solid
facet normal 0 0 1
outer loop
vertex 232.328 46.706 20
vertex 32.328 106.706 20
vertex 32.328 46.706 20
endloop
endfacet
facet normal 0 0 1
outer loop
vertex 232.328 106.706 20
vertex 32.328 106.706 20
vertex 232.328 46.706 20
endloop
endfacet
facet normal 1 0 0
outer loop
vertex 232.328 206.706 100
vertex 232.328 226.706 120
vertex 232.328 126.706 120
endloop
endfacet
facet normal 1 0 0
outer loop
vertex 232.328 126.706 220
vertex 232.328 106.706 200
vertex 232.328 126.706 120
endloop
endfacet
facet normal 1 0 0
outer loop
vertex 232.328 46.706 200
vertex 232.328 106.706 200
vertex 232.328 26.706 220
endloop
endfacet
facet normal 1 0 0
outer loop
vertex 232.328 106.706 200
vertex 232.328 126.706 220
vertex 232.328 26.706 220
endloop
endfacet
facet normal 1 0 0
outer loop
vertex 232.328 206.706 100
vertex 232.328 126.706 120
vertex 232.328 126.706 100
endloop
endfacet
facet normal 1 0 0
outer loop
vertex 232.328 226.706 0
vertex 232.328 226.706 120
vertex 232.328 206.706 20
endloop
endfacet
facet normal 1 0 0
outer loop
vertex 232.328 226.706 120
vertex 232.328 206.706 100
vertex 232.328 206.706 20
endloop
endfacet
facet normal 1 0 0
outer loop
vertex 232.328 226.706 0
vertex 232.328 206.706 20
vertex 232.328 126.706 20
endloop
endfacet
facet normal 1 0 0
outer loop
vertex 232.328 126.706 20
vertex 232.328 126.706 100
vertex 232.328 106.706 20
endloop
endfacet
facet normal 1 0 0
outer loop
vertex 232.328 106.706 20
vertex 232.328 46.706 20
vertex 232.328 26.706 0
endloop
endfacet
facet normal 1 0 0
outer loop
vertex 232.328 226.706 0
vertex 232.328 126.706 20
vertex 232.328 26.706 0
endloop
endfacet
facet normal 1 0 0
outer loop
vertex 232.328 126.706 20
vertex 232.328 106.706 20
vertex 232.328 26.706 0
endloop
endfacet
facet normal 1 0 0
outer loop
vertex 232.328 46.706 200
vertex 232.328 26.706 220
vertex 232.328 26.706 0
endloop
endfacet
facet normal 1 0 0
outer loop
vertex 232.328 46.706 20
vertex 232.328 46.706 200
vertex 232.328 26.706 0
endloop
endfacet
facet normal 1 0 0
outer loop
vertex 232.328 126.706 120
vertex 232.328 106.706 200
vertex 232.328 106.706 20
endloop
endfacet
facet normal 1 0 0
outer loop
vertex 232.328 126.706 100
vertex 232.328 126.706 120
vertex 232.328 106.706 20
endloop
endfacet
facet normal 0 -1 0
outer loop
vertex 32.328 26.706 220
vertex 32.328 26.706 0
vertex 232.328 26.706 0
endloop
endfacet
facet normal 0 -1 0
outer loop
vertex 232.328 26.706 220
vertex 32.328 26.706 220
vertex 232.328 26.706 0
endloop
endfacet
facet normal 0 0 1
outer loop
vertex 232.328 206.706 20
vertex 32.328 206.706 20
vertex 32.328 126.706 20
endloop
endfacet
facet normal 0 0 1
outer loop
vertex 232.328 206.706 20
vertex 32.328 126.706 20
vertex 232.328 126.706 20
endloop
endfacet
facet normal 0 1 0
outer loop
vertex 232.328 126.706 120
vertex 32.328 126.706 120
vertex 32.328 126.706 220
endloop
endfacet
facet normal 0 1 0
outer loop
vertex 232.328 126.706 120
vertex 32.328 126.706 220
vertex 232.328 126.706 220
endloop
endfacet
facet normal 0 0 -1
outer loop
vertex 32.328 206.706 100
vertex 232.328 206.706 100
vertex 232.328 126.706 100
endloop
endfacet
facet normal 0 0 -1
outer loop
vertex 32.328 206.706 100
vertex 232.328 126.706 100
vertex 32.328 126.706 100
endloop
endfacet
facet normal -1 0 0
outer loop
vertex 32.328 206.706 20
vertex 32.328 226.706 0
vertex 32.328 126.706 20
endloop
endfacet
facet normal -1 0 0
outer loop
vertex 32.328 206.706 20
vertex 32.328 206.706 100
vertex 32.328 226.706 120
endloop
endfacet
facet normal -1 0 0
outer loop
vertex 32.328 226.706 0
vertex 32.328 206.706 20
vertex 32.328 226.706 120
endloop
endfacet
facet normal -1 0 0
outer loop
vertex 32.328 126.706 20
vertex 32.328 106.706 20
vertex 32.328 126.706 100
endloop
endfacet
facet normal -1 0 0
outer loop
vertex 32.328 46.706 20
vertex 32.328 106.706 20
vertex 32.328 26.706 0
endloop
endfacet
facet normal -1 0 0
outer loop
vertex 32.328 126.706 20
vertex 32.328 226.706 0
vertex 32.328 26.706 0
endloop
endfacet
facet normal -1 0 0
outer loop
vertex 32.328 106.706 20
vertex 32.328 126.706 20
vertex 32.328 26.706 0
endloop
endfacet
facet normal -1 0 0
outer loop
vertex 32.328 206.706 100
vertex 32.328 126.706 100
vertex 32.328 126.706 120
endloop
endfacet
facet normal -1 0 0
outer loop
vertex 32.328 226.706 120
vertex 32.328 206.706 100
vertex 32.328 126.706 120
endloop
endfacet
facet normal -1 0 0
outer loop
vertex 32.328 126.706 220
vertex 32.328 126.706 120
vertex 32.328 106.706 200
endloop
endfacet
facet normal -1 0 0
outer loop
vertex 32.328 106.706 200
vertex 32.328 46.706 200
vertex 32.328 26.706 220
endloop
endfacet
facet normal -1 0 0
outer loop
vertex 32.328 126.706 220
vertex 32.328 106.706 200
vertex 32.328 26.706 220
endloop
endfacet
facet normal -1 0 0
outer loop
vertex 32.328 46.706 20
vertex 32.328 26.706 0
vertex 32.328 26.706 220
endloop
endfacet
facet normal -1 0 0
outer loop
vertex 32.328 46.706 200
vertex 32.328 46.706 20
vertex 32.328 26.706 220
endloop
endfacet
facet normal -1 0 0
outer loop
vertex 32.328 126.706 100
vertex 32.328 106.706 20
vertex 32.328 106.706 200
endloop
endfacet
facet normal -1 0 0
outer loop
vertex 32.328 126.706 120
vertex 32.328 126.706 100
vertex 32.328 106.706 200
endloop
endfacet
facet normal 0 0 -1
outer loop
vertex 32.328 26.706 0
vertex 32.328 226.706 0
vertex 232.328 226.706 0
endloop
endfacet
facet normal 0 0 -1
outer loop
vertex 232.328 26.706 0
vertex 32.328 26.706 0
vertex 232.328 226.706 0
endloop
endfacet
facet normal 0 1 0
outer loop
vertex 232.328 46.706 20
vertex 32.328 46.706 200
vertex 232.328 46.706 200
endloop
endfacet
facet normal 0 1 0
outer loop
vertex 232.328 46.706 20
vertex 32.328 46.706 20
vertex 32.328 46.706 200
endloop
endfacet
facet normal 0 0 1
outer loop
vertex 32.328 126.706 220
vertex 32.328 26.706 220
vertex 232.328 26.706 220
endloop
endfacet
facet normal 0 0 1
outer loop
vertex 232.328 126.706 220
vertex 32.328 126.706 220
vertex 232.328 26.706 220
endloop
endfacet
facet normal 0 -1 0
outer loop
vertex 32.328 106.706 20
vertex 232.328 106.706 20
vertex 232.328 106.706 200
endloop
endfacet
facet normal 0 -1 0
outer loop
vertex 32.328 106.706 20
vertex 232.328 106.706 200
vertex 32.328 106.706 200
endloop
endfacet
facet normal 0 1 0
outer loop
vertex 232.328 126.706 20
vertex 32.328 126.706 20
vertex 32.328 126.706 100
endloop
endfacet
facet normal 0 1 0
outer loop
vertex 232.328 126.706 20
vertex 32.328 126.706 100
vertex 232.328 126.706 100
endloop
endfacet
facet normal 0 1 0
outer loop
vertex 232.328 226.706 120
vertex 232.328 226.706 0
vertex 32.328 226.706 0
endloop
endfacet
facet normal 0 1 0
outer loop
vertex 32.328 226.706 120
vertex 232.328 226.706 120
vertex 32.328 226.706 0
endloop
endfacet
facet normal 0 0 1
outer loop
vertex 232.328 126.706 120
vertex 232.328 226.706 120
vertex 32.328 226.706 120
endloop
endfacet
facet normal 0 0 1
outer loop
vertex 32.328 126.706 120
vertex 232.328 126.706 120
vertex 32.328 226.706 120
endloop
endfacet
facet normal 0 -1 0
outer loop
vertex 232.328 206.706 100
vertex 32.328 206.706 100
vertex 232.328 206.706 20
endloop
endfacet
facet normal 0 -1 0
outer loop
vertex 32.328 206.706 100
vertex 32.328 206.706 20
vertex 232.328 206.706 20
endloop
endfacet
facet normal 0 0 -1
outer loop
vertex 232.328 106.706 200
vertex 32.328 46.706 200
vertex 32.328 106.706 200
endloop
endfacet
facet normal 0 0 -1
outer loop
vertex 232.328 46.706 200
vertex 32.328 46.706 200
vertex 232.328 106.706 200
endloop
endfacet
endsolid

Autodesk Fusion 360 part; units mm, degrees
sketch "Sketch1" plane through (0, 0, 0) normal (0, 0, 1) x (1, 0, 0)
  line L0 (32.3278, 26.7056) -> (232.3278, 26.7056)
  line L1 (232.3278, 26.7056) -> (232.3278, 226.7056)
  line L2 (232.3278, 226.7056) -> (32.3278, 226.7056)
  line L3 (32.3278, 226.7056) -> (32.3278, 26.7056)
  dimension "d1" = 200
  dimension "d2" = 200
extrude "Extrude1" add sketch "Sketch1" along normal blind 20
sketch "Sketch2" plane through (0, 0, 20) normal (0, 0, 1) x (-1, 0, 0)
  line L0 (-32.3278, -226.7056) -> (-32.3278, -26.7056)
  line L1 (-32.3278, -26.7056) -> (-232.3278, -26.7056)
  line L2 (-232.3278, -26.7056) -> (-232.3278, -226.7056)
  line L3 (-232.3278, -226.7056) -> (-32.3278, -226.7056)
  line L4 (-232.3278, -226.7056) -> (-32.3278, -226.7056)
  line L5 (-32.3278, -226.7056) -> (-32.3278, -206.7056)
  line L6 (-32.3278, -206.7056) -> (-232.3278, -206.7056)
  line L7 (-232.3278, -206.7056) -> (-232.3278, -226.7056)
  dimension "d5" = 20
extrude "Extrude2" add sketch "Sketch2" along normal blind 100 contours L0 L2 L3 L4 L5 L6 L7
sketch "Sketch3" plane through (0, 206.7056, 0) normal (0, -1, 0) x (1, 0, 0)
  line L0 (32.3278, 20) -> (232.3278, 20)
  line L1 (232.3278, 20) -> (232.3278, 120)
  line L2 (232.3278, 120) -> (32.3278, 120)
  line L3 (32.3278, 120) -> (32.3278, 20)
  line L4 (32.3278, 120) -> (232.3278, 120)
  line L5 (232.3278, 120) -> (232.3278, 100)
  line L6 (232.3278, 100) -> (32.3278, 100)
  line L7 (32.3278, 100) -> (32.3278, 120)
  dimension "d8" = 200
  dimension "d9" = 20
extrude "Extrude3" add sketch "Sketch3" along normal blind 80 contours L1 L2 L3 L4 L5 L6 L7
sketch "Sketch4" plane through (0, 0, 20) normal (0, 0, 1) x (-1, 0, 0)
  line L0 (-232.3278, -206.7056) -> (-32.3278, -206.7056)
  line L1 (-32.3278, -206.7056) -> (-32.3278, -26.7056)
  line L2 (-32.3278, -26.7056) -> (-232.3278, -26.7056)
  line L3 (-232.3278, -26.7056) -> (-232.3278, -206.7056)
  line L4 (-232.3278, -26.7056) -> (-32.3278, -26.7056)
  line L5 (-32.3278, -26.7056) -> (-32.3278, -46.7056)
  line L6 (-32.3278, -46.7056) -> (-232.3278, -46.7056)
  line L7 (-232.3278, -46.7056) -> (-232.3278, -26.7056)
  line L8 (-232.3278, -26.7056) -> (-232.3278, -106.7056)
  line L9 (-232.3278, -106.7056) -> (-32.3278, -106.7056)
  line L10 (-32.3278, -106.7056) -> (-32.3278, -126.7056)
  line L11 (-32.3278, -126.7056) -> (-232.3278, -126.7056)
  line L12 (-232.3278, -126.7056) -> (-232.3278, -106.7056)
  dimension "d12" = 20
  dimension "d13" = 80
  dimension "d14" = 20
extrude "Extrude4" add sketch "Sketch4" along normal blind 200 contours L1 L3 L9 L10 L11 L12 | L1 L2 L3 L4 L5 L6 L7 L8
sketch "Sketch5" plane through (0, 46.7056, 0) normal (0, 1, 0) x (-1, 0, 0)
  line L0 (-232.3278, 20) -> (-32.3278, 20)
  line L1 (-32.3278, 20) -> (-32.3278, 220)
  line L2 (-32.3278, 220) -> (-232.3278, 220)
  line L3 (-232.3278, 220) -> (-232.3278, 20)
  line L4 (-232.3278, 220) -> (-32.3278, 220)
  line L5 (-32.3278, 220) -> (-32.3278, 200)
  line L6 (-32.3278, 200) -> (-232.3278, 200)
  line L7 (-232.3278, 200) -> (-232.3278, 220)
  dimension "d17" = 20
extrude "Extrude5" add sketch "Sketch5" along normal blind 60 contours L1 L2 L3 L4 L5 L6 L7
